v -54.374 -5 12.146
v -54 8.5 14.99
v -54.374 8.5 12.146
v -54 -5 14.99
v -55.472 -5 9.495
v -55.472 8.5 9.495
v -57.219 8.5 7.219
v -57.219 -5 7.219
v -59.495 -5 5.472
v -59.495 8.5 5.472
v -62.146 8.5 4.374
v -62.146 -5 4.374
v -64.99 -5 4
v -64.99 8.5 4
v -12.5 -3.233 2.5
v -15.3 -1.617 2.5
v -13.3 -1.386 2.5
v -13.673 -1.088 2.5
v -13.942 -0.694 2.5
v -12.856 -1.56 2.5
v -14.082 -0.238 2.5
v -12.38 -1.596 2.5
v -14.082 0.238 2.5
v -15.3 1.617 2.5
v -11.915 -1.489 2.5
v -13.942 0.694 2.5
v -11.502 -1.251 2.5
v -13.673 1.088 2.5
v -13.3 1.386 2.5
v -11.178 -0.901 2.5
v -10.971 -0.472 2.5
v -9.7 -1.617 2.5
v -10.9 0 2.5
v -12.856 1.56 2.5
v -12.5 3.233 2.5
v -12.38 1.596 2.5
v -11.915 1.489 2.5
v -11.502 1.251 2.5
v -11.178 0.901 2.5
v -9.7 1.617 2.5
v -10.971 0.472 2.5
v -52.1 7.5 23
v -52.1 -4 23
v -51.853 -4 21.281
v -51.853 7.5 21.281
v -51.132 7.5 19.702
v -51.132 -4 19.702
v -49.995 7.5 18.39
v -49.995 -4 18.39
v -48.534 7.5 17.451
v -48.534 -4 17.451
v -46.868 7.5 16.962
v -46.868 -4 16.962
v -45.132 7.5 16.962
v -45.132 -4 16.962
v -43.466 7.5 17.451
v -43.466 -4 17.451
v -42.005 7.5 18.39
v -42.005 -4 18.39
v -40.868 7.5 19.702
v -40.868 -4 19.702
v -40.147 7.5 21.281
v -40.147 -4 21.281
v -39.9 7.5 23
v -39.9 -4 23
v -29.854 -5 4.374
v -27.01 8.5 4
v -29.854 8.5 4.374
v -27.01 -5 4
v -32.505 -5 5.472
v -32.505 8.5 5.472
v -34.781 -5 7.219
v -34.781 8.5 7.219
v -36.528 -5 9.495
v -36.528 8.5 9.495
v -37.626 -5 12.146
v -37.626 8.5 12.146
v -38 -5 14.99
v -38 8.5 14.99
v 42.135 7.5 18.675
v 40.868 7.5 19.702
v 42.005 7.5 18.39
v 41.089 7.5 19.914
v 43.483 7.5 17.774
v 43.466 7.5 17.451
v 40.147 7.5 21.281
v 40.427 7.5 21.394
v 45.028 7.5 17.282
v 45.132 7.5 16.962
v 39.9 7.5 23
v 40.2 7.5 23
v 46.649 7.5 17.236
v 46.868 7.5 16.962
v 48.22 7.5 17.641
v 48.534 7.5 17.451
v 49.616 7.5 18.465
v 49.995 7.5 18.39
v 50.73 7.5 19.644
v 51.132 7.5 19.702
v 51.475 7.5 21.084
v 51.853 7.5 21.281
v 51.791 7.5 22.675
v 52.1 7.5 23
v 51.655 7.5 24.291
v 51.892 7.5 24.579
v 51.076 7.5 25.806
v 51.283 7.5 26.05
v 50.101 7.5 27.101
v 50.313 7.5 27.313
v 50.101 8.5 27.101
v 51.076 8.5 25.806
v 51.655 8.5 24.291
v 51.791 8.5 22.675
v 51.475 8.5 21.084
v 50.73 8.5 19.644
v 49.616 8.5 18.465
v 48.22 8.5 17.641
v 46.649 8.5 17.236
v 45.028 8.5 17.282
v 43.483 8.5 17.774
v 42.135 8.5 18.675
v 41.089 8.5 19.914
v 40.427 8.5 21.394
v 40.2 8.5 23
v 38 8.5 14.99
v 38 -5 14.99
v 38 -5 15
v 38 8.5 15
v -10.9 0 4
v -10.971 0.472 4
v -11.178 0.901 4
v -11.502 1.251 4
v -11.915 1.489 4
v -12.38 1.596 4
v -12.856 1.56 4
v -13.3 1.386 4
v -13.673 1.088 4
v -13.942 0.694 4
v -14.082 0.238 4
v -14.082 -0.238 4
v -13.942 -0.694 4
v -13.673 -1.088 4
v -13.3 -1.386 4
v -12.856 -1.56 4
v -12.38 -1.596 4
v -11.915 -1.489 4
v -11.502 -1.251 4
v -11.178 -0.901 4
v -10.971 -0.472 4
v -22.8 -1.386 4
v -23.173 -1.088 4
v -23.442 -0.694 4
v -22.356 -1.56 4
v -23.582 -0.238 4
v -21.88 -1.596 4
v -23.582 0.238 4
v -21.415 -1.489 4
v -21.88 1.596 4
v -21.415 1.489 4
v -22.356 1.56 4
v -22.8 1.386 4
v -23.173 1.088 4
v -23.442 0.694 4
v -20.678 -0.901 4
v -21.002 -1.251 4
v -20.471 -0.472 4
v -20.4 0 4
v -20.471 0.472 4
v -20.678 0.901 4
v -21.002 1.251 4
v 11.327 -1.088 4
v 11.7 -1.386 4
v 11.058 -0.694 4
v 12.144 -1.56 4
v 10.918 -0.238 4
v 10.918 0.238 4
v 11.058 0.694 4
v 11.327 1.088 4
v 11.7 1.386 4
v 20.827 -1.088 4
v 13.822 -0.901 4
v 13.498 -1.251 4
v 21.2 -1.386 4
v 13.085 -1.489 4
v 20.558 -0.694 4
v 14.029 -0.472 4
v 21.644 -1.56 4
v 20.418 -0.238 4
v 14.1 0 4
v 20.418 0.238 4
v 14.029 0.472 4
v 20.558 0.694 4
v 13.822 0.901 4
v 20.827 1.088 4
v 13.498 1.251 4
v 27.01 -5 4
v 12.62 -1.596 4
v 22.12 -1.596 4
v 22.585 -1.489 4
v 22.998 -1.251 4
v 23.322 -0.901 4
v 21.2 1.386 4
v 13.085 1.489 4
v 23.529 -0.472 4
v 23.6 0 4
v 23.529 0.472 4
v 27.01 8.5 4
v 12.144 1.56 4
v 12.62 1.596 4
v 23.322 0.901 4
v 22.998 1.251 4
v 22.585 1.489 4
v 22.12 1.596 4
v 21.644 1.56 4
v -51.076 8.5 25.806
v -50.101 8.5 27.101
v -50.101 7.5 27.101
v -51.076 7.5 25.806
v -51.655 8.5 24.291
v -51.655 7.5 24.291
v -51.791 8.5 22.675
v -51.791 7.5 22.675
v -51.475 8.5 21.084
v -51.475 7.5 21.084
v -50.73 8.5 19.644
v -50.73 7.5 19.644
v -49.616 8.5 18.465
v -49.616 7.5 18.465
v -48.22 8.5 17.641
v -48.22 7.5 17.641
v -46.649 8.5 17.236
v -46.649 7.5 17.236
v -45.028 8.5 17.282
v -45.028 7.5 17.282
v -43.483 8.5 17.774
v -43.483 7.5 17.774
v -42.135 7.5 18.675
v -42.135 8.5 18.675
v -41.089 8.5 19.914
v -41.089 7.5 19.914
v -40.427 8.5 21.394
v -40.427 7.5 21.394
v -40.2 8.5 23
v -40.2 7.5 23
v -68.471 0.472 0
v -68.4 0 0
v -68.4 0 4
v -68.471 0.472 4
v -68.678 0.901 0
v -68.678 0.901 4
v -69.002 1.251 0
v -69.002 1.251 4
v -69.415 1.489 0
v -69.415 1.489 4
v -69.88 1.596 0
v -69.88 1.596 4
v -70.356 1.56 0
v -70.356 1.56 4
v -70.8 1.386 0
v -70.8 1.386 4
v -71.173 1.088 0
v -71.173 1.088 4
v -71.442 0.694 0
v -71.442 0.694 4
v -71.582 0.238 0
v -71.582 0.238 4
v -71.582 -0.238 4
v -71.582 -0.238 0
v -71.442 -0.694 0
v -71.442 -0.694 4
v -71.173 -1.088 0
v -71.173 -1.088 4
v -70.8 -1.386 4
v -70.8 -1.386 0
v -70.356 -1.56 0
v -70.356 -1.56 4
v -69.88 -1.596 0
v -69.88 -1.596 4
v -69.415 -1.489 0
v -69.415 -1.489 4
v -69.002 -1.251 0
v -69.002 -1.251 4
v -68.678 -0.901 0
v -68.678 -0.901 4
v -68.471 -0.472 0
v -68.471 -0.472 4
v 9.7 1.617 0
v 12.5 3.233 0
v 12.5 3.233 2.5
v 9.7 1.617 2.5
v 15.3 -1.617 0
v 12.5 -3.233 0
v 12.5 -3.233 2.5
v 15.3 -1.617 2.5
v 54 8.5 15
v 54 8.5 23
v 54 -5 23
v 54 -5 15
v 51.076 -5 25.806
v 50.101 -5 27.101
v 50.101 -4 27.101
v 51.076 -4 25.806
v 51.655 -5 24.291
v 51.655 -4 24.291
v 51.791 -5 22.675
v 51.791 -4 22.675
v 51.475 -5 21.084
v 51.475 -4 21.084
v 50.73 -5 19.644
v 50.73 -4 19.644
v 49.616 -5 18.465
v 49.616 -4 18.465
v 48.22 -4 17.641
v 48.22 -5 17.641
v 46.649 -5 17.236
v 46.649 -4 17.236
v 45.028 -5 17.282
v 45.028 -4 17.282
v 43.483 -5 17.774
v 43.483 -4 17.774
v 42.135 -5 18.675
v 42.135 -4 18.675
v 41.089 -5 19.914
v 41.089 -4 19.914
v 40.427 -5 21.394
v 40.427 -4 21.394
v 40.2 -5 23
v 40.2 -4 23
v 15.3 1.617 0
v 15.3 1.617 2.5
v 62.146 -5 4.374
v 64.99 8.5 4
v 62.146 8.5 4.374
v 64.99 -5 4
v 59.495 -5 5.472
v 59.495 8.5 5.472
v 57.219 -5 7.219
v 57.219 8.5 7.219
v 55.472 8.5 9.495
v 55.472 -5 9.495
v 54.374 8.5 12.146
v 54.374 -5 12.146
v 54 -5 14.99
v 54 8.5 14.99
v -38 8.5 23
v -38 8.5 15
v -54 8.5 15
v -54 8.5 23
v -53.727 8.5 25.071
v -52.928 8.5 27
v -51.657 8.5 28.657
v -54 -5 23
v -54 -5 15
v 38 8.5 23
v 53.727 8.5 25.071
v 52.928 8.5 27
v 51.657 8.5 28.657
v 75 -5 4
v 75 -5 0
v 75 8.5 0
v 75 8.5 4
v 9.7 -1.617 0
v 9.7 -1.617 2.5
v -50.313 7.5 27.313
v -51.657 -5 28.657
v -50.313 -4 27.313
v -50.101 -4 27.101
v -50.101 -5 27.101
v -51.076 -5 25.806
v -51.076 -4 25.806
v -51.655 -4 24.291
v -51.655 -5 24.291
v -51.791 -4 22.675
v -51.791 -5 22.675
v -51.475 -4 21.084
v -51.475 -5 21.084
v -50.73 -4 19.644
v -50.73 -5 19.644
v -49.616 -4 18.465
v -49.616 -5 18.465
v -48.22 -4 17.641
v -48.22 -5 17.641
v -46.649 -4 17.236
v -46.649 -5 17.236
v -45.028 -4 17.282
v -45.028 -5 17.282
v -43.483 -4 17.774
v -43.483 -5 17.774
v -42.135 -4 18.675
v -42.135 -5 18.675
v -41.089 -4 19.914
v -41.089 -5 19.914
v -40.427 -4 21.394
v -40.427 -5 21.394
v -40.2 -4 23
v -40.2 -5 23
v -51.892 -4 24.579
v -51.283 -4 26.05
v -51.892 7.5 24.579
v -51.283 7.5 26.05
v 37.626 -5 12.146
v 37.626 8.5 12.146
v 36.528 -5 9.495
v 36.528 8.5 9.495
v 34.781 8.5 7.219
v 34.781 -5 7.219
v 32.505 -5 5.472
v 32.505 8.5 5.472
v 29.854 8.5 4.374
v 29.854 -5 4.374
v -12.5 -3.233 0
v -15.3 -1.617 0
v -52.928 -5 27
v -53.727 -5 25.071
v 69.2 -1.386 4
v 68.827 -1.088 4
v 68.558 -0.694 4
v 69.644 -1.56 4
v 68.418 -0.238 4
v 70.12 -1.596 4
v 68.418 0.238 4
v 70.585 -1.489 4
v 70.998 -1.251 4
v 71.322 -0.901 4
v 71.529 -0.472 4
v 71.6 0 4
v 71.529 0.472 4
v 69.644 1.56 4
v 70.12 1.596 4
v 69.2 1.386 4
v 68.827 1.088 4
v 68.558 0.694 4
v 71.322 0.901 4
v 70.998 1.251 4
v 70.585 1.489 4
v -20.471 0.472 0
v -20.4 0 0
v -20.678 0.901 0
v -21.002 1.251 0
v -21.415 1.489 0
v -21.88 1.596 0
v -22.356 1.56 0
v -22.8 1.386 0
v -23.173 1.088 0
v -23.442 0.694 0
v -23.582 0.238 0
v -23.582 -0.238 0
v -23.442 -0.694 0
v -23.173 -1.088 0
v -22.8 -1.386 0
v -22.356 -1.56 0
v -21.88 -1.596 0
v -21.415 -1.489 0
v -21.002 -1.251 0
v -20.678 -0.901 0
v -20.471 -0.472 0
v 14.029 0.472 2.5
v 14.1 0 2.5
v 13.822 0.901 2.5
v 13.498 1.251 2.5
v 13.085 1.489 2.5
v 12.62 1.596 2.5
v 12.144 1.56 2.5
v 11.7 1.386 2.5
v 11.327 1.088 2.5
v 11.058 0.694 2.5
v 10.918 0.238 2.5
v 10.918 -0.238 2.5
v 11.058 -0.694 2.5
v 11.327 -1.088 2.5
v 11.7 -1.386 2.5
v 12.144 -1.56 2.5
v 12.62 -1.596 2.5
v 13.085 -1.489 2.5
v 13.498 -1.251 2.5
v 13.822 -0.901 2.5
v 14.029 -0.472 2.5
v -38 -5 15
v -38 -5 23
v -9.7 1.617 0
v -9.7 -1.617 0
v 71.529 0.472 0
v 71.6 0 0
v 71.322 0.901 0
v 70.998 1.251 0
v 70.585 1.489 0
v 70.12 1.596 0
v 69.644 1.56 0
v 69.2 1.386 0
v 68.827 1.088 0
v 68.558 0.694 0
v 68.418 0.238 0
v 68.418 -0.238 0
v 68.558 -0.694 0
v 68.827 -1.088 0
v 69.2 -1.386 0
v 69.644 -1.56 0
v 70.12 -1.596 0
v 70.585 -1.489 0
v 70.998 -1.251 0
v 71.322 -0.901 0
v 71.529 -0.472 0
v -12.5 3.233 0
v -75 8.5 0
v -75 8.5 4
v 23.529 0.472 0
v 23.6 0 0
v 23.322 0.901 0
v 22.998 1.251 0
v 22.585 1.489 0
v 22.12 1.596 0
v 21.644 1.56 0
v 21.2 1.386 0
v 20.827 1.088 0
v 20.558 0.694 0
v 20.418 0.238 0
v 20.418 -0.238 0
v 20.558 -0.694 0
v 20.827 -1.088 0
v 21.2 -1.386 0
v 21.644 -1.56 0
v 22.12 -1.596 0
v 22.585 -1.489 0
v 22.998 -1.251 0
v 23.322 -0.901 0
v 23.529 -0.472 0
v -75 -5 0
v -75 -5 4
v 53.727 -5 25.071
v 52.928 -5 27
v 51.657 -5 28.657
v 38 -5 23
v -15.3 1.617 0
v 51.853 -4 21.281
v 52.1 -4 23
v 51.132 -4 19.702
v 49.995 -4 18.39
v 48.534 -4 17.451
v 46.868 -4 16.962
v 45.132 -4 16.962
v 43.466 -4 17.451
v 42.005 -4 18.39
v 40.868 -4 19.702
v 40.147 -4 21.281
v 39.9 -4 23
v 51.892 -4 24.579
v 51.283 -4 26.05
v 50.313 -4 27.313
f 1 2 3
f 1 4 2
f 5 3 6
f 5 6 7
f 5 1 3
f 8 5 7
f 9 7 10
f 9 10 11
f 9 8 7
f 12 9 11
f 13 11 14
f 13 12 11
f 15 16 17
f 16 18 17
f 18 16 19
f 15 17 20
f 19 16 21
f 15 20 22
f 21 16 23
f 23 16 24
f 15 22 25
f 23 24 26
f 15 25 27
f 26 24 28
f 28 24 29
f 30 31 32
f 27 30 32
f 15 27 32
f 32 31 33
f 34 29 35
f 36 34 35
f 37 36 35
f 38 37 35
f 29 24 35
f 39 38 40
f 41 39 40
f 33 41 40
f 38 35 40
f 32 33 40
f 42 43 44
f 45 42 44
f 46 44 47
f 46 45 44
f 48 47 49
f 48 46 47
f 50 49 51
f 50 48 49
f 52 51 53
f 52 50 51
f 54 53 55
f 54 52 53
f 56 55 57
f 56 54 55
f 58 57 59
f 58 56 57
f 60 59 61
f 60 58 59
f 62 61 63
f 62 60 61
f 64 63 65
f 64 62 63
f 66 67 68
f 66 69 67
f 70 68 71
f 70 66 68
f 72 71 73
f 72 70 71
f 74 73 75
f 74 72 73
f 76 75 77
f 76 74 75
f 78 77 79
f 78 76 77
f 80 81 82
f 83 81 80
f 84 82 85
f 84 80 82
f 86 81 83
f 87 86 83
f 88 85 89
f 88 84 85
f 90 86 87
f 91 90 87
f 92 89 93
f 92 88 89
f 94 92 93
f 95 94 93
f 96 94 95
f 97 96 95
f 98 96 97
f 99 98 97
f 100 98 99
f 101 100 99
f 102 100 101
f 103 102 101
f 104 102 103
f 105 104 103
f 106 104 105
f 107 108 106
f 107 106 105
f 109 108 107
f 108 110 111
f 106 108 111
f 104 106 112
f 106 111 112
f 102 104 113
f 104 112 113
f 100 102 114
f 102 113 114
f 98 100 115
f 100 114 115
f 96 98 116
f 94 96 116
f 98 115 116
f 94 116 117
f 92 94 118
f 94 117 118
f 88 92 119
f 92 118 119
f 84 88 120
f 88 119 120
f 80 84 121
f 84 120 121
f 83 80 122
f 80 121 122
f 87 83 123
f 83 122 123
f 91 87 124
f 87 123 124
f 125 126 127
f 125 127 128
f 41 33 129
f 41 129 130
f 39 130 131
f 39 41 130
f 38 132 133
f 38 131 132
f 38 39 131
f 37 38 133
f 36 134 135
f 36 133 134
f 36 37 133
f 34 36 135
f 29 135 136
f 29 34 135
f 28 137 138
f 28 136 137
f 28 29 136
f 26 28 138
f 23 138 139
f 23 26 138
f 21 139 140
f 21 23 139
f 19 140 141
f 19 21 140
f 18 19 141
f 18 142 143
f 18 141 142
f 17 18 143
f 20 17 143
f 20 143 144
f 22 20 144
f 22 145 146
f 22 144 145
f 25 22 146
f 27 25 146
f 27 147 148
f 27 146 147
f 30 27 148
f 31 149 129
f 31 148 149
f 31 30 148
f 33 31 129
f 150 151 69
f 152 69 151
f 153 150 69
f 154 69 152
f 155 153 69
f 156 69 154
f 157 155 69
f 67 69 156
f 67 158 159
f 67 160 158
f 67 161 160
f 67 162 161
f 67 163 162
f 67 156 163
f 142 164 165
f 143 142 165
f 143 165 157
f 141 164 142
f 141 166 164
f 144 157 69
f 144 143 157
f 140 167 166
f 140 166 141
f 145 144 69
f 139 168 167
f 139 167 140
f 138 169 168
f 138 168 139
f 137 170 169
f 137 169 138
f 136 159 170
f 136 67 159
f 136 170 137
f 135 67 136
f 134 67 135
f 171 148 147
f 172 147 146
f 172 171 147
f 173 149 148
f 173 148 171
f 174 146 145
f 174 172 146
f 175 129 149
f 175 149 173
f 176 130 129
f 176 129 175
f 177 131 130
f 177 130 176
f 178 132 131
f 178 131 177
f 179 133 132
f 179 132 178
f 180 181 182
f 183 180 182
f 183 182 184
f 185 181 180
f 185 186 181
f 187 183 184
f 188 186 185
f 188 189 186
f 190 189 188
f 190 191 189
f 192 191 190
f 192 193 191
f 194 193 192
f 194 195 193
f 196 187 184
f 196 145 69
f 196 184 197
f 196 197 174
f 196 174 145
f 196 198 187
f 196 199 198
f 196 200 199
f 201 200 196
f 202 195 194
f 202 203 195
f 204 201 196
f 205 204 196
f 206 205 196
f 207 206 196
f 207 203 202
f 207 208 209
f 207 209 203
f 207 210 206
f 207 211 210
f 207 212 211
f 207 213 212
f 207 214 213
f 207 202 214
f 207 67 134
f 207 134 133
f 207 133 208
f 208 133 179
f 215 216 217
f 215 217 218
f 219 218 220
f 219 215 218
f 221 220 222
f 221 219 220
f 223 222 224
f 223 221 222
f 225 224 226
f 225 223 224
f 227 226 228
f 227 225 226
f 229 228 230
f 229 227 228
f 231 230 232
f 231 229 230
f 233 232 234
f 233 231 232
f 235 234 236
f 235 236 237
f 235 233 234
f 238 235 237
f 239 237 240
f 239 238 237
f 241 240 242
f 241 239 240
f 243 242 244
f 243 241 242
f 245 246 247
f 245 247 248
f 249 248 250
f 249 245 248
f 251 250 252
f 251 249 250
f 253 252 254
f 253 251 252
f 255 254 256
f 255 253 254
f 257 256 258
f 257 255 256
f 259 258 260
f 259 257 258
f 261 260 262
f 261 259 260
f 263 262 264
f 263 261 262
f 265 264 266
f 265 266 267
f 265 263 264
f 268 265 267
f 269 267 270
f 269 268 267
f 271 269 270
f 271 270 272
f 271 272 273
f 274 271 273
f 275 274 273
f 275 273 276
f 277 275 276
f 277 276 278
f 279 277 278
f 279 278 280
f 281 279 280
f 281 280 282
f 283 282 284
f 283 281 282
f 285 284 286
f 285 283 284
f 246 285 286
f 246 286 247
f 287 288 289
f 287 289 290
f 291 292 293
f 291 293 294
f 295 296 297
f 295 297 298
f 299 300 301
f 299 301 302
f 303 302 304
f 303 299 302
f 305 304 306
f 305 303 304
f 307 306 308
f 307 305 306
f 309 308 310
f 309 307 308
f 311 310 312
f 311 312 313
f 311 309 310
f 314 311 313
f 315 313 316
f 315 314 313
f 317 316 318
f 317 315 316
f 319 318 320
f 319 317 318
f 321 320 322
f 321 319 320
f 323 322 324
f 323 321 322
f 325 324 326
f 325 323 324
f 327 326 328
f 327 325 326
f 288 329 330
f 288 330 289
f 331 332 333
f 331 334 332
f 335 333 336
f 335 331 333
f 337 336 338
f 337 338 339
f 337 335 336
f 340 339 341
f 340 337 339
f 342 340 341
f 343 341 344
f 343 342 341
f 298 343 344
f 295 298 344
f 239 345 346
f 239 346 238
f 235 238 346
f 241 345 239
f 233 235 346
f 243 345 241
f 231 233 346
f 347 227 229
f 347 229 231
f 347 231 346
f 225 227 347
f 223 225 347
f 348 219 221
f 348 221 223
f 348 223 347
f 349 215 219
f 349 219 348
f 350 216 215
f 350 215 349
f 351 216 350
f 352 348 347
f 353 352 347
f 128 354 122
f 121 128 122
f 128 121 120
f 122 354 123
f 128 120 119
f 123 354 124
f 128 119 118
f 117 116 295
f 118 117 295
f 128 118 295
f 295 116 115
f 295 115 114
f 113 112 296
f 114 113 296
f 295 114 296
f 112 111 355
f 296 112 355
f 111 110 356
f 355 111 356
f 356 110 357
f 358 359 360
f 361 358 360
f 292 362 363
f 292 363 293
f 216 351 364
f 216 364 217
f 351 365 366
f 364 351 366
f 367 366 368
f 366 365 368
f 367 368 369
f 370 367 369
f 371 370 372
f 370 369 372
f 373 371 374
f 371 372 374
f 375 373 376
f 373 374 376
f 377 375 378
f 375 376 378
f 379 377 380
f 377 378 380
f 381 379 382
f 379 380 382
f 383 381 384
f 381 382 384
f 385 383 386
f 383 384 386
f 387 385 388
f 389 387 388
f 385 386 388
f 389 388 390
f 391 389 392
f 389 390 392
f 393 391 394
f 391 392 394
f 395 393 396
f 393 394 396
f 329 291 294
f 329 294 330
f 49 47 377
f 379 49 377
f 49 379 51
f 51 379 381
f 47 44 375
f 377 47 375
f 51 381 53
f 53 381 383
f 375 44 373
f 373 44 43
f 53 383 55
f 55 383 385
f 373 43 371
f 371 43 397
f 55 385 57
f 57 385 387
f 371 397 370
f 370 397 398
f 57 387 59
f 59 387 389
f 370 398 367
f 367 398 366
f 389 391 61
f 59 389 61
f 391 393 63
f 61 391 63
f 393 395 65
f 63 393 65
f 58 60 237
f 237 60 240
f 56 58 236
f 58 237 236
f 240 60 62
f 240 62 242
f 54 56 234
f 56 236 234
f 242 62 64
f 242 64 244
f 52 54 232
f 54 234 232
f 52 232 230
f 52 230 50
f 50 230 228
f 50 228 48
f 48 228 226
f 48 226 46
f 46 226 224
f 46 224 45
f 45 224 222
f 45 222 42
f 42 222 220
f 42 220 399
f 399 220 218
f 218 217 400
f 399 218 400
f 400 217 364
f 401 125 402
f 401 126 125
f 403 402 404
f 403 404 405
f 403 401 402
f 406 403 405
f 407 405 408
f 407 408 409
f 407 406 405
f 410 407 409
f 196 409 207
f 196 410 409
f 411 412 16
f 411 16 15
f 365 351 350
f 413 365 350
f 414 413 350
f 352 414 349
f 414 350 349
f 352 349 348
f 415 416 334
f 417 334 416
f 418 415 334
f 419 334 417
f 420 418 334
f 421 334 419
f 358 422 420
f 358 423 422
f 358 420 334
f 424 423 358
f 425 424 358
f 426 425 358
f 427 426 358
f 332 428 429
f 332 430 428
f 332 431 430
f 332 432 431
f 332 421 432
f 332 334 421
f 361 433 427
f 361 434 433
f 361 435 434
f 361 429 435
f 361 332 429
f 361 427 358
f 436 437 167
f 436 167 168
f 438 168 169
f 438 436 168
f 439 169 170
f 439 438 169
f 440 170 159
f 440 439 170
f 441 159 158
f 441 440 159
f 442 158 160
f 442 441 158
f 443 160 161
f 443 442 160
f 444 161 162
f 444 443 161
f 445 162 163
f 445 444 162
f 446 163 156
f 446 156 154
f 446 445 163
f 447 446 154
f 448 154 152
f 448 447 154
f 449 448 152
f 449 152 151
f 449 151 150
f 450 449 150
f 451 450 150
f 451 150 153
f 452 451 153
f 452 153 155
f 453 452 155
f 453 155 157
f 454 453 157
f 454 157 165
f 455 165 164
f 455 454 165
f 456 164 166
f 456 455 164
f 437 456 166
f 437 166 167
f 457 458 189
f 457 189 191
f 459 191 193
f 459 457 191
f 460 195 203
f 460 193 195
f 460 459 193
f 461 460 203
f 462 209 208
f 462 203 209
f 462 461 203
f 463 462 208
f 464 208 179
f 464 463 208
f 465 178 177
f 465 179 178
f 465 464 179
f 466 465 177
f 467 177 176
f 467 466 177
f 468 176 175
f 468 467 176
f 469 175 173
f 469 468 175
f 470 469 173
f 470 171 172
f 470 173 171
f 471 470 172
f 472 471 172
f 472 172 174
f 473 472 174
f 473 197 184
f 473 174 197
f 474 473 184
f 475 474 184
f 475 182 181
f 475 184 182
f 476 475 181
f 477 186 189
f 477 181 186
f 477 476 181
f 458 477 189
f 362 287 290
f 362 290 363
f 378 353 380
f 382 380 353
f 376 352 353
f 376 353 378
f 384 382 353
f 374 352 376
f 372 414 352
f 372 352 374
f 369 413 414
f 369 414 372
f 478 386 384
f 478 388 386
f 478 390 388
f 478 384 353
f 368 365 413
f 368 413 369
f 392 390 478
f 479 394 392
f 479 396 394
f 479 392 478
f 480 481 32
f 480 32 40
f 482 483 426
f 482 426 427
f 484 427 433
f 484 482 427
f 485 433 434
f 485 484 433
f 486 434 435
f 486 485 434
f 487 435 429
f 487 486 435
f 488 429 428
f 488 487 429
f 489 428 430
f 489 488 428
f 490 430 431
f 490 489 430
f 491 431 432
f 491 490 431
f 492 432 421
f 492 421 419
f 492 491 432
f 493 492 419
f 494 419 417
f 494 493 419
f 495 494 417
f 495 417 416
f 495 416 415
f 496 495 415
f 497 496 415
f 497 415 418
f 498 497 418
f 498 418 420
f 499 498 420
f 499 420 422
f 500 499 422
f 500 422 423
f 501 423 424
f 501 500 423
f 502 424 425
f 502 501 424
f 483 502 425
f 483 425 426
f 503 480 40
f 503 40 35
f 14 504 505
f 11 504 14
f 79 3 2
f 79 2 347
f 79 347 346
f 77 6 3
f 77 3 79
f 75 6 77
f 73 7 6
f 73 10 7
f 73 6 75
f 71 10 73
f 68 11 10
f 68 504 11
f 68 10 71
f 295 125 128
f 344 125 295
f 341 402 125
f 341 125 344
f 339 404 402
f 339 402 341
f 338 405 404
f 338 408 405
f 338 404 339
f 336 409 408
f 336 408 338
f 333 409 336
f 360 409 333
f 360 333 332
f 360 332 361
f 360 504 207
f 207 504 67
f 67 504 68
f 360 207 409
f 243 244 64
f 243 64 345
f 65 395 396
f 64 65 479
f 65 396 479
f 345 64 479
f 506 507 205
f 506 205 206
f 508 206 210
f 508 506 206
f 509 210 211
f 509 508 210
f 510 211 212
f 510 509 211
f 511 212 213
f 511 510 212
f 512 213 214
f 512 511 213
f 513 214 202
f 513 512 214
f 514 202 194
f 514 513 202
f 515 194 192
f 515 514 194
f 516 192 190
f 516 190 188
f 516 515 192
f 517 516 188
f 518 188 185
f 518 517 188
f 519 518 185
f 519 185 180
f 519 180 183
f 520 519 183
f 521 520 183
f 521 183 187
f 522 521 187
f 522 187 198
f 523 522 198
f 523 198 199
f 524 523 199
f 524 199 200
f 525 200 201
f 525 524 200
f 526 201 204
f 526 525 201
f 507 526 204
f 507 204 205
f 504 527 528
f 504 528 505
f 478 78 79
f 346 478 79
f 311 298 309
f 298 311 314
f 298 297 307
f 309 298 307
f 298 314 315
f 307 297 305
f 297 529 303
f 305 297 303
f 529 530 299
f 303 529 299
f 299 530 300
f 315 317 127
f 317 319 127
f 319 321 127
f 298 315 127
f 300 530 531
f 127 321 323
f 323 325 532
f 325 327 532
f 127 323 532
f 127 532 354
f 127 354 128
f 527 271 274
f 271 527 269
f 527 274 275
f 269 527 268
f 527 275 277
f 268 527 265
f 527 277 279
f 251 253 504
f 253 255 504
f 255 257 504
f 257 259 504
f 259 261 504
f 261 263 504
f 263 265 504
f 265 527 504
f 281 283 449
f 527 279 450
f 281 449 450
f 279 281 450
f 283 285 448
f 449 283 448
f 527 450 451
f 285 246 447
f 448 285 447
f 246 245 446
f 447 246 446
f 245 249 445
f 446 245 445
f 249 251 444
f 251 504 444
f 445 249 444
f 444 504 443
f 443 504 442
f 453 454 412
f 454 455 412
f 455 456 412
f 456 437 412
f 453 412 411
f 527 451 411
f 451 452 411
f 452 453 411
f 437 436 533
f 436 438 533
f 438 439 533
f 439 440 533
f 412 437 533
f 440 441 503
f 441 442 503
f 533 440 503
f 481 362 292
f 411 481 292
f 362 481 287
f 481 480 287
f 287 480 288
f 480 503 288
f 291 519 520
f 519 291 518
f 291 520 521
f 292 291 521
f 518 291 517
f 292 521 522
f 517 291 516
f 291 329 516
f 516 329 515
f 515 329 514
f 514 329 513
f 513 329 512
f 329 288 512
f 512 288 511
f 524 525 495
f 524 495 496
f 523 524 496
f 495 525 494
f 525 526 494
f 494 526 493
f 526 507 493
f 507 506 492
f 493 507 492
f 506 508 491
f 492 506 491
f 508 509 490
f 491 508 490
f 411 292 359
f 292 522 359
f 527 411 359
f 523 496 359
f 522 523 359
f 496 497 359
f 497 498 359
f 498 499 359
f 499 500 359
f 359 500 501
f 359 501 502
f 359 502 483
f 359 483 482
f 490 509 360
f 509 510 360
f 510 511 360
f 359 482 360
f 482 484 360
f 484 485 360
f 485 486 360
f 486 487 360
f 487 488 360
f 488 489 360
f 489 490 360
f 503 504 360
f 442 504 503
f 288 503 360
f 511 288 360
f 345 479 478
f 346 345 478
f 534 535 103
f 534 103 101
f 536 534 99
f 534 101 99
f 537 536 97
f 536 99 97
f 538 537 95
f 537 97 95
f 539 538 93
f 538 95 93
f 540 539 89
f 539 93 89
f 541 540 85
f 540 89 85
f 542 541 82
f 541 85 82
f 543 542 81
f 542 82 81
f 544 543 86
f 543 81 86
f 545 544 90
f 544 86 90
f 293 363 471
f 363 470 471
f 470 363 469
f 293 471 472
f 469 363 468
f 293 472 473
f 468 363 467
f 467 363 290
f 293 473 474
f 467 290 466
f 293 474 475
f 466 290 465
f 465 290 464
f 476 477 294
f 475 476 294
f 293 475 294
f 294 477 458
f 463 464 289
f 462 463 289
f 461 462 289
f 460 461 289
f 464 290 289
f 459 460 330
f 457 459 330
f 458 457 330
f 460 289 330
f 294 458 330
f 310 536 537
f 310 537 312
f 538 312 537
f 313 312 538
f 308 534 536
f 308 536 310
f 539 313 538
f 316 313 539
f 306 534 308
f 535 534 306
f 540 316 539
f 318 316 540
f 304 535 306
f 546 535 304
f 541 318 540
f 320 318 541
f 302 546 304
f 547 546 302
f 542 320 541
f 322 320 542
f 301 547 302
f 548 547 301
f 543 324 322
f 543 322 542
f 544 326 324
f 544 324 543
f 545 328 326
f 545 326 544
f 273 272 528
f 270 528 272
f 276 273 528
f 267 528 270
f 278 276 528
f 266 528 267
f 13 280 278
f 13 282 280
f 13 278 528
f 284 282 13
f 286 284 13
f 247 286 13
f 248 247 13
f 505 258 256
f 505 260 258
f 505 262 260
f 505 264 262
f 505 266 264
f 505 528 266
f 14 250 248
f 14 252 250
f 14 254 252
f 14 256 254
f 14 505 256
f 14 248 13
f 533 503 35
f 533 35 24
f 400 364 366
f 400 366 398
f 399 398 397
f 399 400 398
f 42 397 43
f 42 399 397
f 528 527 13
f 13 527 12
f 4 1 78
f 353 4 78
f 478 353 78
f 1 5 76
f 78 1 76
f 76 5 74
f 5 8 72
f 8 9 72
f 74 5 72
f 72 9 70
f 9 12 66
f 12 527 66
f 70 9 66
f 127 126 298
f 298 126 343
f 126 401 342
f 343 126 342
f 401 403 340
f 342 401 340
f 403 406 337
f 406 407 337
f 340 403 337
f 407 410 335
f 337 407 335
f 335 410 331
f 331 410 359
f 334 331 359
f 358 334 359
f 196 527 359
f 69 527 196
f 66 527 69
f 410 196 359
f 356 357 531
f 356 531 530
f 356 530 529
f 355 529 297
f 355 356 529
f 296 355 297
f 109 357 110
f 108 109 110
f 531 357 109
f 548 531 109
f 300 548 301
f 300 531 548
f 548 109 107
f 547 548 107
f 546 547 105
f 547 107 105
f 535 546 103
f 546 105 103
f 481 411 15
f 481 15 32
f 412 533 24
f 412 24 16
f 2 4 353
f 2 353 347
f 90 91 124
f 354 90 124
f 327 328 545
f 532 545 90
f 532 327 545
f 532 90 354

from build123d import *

# Parameters (mm, degrees)
PAD002_DEPTH            = 13.5
PAD003_DEPTH            = 1
PAD008_DEPTH            = 1
BODY001_PLACEMENT_ANGLE = -90.0000000001
SKETCH_W                = 150
SKETCH_H                = 13.5
SKETCH_R                = 1.6
PAD_DEPTH               = 4
SKETCH001_W             = 16
SKETCH001_H             = 13.5
PAD001_DEPTH            = 15
FILLET_R                = 10.99
POCKET_DEPTH            = 2.5
SKETCH015_R             = 1.6
POCKET001_DEPTH         = 15.001


with BuildPart() as clip_lm6uu:
    # Sketch003 → Pad002 (new body)
    with BuildSketch(Plane.YZ):
        with BuildLine():
            Line((-8, 0), (-8, -8))
            Line((-8, -8), (8, -8))
            Line((8, 0), (8, -8))
            Line((8, 0), (6.1, 0))
            ThreePointArc((-6.1, 0), (0, -6.1), (6.1, 0))
            ThreePointArc((-4.3133513652, 4.3133513652), (-5.6356651483, 2.3343689374), (-6.1, 0))
            Line((-5.6568542495, 5.6568542495), (-4.3133513652, 4.3133513652))
            ThreePointArc((-5.6568542495, 5.6568542495), (-7.3910362601, 3.0614674589), (-8, 0))
        make_face()
    extrude(amount=PAD002_DEPTH)

    # Sketch002 → Pad003 (join)
    with BuildSketch(Plane.YZ):
        with BuildLine():
            ThreePointArc((-4.1012193309, 4.1012193309), (-2.2195639077, -5.3585012886), (5.8, 0))
            Line((5.8, 0), (6.1, 0))
            ThreePointArc((-4.3133513652, 4.3133513652), (-2.3343689374, -5.6356651483), (6.1, 0))
            Line((-4.1012193309, 4.1012193309), (-4.3133513652, 4.3133513652))
        make_face()
    extrude(amount=PAD003_DEPTH)

    # Sketch013 (on Face5 of Pad003) → Pad008 (join)
    with BuildSketch(Plane.YZ.offset(13.5)):
        with BuildLine():
            ThreePointArc((-4.3133513652, 4.3133513652), (-2.3343689374, -5.6356651483), (6.1, 0))
            Line((5.8, 0), (6.1, 0))
            ThreePointArc((-4.1012193309, 4.1012193309), (-2.2195639077, -5.3585012886), (5.8, 0))
            Line((-4.3133513652, 4.3133513652), (-4.1012193309, 4.1012193309))
        make_face()
    extrude(amount=-PAD008_DEPTH)


with BuildPart() as clip_lm6uu_1:
    # Body001 placement: moved
    add(clip_lm6uu.part.moved(Location((-46, 8.5, 23))).rotate(Axis((-46, 8.5, 23), (0, 0, 1)), BODY001_PLACEMENT_ANGLE))


with BuildPart() as clip_lm6uu_mirror:
    # Part__Mirroring: instance of Clip_LM6UU
    add(clip_lm6uu_1.part.mirror(Plane(origin=(0, 0, 0), x_dir=(0, -1, 0), z_dir=(1, 0, 0))))


with BuildPart() as bedclamping_refined:
    # Sketch → Pad (new body)
    with BuildSketch(Plane.XY):
        with Locations((0, 1.75)):
            Rectangle(SKETCH_W, SKETCH_H)
        with Locations((-70, 0)):
            Circle(SKETCH_R, mode=Mode.SUBTRACT)
        with Locations((-22, 0)):
            Circle(SKETCH_R, mode=Mode.SUBTRACT)
        with Locations((22, 0)):
            Circle(SKETCH_R, mode=Mode.SUBTRACT)
        with Locations((70, 0)):
            Circle(SKETCH_R, mode=Mode.SUBTRACT)
    extrude(amount=PAD_DEPTH)

    # Sketch001 → Pad001 (join)
    with BuildSketch(Plane.XY):
        with Locations((-46, 1.75)):
            Rectangle(SKETCH001_W, SKETCH001_H)
        with Locations((46, 1.75)):
            Rectangle(SKETCH001_W, SKETCH001_H)
    extrude(amount=PAD001_DEPTH)

    # Fillet
    fillet_edges = [bedclamping_refined.edges().sort_by_distance(p)[0] for p in [
        (-54, 1.75, 4),
        (-38, 1.75, 4),
        (38, 1.75, 4),
        (54, 1.75, 4),
    ]]
    fillet(fillet_edges, radius=FILLET_R)

    # Sketch014 → Pocket (cut)
    with BuildSketch(Plane.XY):
        Polygon((-12.5, -3.2331615075), (-9.7, -1.6165807537), (-9.7, 1.6165807537), (-12.5, 3.2331615075), (-15.3, 1.6165807537), (-15.3, -1.6165807537), align=None)
        Polygon((12.5, -3.2331615075), (15.3, -1.6165807537), (15.3, 1.6165807537), (12.5, 3.2331615075), (9.7, 1.6165807537), (9.7, -1.6165807537), align=None)
    extrude(amount=POCKET_DEPTH, mode=Mode.SUBTRACT)

    # Sketch015 → Pocket001 (cut, through all)
    with BuildSketch(Plane.XY):
        with Locations((-12.5, 0)):
            Circle(SKETCH015_R)
        with Locations((12.5, 0)):
            Circle(SKETCH015_R)
    extrude(amount=POCKET001_DEPTH, mode=Mode.SUBTRACT)

    # Fusion: union Clip_LM6UU_Mirror, Clip_LM6UU
    add(clip_lm6uu_mirror.part)
    add(clip_lm6uu_1.part)


solid = bedclamping_refined.part
